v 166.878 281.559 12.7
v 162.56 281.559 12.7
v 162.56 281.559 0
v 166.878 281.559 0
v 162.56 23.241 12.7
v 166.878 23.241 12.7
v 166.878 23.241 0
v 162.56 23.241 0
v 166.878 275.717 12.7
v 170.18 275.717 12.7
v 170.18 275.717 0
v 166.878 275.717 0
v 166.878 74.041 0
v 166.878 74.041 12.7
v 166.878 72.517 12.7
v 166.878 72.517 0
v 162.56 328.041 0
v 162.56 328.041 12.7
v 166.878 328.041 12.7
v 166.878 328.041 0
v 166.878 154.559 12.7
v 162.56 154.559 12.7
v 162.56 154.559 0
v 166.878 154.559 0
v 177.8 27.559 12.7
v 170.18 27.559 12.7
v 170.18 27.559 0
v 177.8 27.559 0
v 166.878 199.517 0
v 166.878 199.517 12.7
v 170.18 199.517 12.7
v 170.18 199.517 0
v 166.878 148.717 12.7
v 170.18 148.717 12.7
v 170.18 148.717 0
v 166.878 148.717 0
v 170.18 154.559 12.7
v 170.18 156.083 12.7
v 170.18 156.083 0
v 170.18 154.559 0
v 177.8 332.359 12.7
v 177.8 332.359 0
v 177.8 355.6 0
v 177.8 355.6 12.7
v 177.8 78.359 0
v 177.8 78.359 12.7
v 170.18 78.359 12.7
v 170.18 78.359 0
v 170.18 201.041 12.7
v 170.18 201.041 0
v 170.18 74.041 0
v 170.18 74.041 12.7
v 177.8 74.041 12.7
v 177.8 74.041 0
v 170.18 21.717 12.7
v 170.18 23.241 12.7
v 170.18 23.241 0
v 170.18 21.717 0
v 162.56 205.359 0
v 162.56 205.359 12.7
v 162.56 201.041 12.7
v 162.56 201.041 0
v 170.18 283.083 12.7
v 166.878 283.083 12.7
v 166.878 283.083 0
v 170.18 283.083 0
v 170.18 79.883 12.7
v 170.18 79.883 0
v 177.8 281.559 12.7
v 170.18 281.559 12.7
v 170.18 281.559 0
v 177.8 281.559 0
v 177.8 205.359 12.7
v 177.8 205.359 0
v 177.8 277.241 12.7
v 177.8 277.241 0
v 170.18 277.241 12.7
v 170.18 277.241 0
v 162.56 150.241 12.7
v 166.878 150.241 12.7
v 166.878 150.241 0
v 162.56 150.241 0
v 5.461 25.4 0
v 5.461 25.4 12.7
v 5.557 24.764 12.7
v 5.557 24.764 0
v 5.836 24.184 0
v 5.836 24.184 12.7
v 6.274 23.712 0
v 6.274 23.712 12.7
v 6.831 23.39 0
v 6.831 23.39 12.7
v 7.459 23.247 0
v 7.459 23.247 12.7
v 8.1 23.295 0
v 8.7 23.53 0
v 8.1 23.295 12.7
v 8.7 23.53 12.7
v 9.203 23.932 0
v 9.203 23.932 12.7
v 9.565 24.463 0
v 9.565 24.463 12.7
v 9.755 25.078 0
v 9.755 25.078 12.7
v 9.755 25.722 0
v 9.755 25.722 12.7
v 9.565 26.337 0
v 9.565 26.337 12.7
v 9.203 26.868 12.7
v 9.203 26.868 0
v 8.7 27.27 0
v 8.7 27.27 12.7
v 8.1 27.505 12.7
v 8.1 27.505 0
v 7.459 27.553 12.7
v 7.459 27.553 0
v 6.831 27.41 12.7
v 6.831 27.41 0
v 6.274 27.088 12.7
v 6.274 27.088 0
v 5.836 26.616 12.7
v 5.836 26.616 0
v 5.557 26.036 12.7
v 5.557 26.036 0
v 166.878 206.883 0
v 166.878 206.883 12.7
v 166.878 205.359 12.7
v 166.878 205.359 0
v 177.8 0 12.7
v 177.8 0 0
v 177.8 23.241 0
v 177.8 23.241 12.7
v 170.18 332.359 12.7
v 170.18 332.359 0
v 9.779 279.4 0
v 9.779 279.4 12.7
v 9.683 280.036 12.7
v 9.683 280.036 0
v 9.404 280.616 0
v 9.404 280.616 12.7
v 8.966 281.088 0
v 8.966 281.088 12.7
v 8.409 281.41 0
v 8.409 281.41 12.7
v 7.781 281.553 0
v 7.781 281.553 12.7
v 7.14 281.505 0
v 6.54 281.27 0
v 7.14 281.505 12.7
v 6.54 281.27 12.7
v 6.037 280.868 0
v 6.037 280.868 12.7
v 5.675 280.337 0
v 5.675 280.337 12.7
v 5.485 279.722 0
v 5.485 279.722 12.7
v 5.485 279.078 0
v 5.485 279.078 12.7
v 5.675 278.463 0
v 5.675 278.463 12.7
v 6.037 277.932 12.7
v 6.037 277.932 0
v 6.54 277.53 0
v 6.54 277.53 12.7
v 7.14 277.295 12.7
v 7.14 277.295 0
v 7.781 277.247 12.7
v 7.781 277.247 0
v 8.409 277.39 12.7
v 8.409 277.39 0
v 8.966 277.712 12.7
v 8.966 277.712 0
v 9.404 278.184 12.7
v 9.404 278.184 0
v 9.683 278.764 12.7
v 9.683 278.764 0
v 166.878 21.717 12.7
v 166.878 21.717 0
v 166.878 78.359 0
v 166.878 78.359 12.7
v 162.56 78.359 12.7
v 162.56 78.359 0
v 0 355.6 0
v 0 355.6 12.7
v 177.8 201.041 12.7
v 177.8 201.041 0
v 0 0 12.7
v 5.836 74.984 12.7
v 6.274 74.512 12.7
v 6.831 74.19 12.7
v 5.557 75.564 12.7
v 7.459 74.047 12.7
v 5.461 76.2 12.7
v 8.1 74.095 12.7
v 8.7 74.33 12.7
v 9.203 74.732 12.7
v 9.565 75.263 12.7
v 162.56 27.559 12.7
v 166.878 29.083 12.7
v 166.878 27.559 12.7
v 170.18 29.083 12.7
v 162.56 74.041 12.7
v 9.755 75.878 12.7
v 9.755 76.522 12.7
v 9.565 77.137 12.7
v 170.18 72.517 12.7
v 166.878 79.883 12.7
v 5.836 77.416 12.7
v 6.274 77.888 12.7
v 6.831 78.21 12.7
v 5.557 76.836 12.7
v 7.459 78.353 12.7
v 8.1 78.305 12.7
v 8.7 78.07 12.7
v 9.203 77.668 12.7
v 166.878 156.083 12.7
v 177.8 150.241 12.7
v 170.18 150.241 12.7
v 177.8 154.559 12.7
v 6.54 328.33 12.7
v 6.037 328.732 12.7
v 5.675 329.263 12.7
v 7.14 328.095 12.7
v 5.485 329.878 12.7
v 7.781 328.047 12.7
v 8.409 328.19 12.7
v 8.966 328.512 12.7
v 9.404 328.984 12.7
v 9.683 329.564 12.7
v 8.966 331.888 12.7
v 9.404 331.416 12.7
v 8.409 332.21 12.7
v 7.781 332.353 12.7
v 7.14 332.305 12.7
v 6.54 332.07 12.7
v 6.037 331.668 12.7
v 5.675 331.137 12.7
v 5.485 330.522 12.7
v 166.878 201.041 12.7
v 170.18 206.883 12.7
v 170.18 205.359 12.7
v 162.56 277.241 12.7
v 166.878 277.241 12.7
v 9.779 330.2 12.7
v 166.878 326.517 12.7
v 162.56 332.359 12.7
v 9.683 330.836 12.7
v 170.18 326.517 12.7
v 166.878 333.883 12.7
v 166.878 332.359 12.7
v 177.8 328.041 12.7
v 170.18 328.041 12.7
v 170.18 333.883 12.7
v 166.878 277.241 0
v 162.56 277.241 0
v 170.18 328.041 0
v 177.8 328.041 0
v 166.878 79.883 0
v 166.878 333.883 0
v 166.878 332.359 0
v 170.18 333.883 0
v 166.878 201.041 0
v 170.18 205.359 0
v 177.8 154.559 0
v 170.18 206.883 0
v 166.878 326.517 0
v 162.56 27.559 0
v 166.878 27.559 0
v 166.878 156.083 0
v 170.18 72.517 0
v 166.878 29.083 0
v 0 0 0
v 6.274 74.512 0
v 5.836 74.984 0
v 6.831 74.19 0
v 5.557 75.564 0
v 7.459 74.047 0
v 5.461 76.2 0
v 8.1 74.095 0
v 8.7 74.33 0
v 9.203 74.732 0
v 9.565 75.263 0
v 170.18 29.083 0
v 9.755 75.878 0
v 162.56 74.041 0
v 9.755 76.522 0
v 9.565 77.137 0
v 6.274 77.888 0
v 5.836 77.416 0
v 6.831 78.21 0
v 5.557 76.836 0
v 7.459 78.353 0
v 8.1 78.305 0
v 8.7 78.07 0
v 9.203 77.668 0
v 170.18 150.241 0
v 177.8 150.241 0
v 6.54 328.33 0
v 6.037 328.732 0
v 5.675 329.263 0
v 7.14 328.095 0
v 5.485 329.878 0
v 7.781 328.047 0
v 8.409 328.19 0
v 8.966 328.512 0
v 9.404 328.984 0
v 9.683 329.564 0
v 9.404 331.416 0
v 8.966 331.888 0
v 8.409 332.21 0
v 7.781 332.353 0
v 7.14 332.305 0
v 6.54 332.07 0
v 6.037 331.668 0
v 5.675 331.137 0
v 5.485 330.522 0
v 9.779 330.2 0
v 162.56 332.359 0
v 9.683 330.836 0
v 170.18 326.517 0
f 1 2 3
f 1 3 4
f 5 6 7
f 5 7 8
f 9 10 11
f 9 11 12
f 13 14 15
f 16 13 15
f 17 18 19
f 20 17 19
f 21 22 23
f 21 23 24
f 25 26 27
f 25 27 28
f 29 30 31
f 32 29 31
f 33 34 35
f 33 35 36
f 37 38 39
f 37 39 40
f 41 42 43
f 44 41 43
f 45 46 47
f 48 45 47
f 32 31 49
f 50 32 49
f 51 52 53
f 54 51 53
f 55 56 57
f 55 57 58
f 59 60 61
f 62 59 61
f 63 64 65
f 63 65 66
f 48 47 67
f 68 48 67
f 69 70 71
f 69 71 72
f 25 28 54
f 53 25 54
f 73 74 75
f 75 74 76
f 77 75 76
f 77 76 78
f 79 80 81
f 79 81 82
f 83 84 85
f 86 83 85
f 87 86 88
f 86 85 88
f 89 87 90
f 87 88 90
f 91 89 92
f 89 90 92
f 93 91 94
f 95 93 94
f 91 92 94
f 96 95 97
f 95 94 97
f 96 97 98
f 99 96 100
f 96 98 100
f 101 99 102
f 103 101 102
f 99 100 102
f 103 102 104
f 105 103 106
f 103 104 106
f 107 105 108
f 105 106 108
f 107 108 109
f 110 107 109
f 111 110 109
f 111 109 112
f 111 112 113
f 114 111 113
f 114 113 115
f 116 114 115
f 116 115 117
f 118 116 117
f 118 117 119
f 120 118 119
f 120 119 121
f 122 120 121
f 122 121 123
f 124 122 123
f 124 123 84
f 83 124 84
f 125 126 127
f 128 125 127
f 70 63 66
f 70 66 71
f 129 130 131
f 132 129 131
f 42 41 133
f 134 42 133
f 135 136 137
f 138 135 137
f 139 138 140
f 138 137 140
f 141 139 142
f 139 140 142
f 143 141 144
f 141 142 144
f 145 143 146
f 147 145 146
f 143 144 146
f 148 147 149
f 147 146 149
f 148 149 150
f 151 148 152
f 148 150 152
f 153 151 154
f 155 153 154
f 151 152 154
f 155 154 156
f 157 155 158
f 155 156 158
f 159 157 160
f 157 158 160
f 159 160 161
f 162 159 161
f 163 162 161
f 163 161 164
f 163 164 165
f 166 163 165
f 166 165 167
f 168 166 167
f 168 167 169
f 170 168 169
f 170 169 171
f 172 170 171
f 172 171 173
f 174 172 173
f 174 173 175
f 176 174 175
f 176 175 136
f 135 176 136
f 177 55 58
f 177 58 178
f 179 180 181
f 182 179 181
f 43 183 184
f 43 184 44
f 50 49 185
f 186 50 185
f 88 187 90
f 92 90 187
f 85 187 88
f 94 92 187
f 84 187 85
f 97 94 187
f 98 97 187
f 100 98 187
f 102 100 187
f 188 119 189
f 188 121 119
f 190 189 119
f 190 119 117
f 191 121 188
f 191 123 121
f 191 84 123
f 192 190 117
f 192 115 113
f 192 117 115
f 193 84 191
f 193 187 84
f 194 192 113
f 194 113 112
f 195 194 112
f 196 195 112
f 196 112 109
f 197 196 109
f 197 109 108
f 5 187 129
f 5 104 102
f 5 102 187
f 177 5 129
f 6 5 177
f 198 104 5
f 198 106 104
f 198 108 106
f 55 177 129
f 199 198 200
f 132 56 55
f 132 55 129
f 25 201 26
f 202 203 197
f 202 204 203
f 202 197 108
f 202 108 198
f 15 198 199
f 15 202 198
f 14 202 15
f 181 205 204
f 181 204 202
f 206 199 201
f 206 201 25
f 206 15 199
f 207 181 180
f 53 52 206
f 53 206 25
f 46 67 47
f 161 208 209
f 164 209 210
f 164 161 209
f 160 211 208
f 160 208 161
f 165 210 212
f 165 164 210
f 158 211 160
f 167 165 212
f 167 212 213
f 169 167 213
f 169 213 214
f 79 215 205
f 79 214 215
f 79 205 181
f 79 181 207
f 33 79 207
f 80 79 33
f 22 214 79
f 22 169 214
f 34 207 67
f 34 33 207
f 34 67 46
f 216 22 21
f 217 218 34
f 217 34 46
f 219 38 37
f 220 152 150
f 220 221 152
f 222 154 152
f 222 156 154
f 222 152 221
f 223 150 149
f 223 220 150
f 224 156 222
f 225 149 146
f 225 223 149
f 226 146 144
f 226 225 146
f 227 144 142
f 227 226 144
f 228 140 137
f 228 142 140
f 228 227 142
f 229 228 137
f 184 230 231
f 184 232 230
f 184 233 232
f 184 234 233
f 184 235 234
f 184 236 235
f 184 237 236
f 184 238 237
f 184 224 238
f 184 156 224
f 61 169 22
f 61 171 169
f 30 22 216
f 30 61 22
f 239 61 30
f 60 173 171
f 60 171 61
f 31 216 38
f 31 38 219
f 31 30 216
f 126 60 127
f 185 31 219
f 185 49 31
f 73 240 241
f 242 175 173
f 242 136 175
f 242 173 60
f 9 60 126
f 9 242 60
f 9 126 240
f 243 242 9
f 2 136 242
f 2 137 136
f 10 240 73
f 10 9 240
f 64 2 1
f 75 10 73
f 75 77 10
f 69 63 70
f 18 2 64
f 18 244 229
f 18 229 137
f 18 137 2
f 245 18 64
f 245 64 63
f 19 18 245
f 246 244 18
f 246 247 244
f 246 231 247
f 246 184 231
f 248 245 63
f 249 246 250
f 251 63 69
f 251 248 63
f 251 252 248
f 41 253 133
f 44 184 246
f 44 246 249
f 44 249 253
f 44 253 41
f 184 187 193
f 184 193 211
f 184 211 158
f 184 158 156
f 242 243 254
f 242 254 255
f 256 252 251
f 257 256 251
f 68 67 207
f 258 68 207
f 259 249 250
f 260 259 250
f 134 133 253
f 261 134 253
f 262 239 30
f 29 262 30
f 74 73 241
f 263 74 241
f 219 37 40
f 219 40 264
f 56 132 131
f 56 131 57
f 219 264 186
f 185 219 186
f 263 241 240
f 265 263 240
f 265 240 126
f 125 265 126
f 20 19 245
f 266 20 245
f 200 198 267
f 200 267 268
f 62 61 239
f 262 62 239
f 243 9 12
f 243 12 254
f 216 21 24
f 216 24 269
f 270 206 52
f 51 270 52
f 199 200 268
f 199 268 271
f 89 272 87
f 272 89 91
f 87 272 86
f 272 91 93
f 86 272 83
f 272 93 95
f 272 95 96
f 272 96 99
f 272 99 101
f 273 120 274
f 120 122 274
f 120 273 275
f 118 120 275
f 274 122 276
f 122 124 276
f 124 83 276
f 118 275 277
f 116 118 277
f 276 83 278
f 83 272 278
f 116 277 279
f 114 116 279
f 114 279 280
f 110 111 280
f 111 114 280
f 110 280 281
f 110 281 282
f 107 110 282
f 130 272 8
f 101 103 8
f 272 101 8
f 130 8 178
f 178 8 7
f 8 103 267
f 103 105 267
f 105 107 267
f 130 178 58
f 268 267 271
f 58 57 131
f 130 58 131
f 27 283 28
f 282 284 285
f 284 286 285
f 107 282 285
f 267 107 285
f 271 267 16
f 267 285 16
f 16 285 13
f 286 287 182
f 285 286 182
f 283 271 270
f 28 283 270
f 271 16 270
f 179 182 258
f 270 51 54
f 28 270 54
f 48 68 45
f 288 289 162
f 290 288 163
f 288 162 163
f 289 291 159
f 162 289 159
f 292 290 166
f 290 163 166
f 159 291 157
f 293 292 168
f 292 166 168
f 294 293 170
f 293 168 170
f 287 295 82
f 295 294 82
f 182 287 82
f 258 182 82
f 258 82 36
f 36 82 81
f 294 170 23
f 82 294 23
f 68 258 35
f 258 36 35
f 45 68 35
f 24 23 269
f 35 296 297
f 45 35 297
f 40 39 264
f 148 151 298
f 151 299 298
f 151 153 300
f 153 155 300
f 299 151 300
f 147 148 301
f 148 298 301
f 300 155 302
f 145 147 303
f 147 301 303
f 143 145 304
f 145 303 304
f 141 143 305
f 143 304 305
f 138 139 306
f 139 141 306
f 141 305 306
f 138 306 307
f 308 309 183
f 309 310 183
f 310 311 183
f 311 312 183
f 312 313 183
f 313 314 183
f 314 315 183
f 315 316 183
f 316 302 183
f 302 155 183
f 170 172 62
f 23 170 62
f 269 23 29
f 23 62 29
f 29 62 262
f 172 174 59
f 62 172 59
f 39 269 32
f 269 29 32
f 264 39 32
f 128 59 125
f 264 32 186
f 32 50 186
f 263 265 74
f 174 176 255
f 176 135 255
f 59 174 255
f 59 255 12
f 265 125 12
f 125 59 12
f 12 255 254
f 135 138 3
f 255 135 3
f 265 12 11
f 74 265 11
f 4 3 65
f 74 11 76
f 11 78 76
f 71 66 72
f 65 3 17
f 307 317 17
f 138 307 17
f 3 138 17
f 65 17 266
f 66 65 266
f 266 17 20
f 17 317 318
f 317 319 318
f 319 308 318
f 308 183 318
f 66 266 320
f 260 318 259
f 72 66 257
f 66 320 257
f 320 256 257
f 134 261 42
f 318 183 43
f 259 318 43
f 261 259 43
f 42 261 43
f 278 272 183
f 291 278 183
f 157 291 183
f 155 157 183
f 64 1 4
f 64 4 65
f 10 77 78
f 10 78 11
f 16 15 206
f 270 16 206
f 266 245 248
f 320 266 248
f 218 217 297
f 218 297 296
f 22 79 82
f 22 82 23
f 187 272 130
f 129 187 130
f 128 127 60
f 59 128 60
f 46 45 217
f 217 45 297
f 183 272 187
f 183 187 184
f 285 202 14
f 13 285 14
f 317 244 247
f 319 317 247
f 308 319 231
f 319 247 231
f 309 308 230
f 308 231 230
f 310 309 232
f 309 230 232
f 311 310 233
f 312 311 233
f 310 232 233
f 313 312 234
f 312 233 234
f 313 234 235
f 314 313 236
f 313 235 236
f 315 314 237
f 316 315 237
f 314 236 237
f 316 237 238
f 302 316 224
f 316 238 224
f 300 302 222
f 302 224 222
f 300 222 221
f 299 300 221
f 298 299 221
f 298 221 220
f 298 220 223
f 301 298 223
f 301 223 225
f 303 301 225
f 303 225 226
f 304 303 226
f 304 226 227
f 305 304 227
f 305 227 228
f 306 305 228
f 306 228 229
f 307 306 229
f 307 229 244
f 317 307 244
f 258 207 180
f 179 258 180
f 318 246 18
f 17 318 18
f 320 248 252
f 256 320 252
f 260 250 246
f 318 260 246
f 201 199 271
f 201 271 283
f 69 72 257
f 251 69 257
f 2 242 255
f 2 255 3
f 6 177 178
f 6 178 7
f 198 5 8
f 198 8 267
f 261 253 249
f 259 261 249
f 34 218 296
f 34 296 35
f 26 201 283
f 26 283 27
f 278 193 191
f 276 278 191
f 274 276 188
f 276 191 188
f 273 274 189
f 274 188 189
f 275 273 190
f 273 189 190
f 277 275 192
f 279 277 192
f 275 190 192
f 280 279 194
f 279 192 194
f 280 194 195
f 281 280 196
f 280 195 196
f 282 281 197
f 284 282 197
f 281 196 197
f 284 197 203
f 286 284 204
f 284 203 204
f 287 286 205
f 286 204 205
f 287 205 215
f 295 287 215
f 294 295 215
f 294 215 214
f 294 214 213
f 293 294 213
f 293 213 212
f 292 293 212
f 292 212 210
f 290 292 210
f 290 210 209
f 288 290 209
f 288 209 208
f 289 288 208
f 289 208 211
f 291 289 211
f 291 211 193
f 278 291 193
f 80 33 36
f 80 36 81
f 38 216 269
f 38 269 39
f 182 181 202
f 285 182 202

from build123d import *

# Parameters (mm, degrees)
SKETCH1_W           = 177.8
SKETCH1_H           = 355.6
BOSS_EXTRUDE1_DEPTH = 12.7
SKETCH3_R           = 2.159
CUT_EXTRUDE1_DEPTH  = 398.775677989


with BuildPart() as part:
    # Sketch1 → Boss-Extrude1 (new body)
    with BuildSketch(Plane.XY):
        with Locations((88.9, 177.8)):
            Rectangle(SKETCH1_W, SKETCH1_H)
    extrude(amount=BOSS_EXTRUDE1_DEPTH)

    # Sketch3 → Cut-Extrude1 (cut, through all)
    with BuildSketch(Plane.XY.offset(12.7)):
        with Locations((7.62, 330.2)):
            Circle(SKETCH3_R)
        with Locations((7.62, 279.4)):
            Circle(SKETCH3_R)
        with Locations(Location((7.62, 76.2, 0), (0, 0, 180))):
            Circle(SKETCH3_R)
        with Locations(Location((7.62, 25.4, 0), (0, 0, 180))):
            Circle(SKETCH3_R)
        Polygon((177.8, 332.359), (170.18, 332.359), (170.18, 333.883), (166.878, 333.883), (166.878, 332.359), (162.56, 332.359), (162.56, 328.041), (166.878, 328.041), (166.878, 326.517), (170.18, 326.517), (170.18, 328.041), (177.8, 328.041), align=None)
        Polygon((177.8, 281.559), (177.8, 277.241), (170.18, 277.241), (170.18, 275.717), (166.878, 275.717), (166.878, 277.241), (162.56, 277.241), (162.56, 281.559), (166.878, 281.559), (166.878, 283.083), (170.18, 283.083), (170.18, 281.559), align=None)
        Polygon((177.8, 78.359), (170.18, 78.359), (170.18, 79.883), (166.878, 79.883), (166.878, 78.359), (162.56, 78.359), (162.56, 74.041), (166.878, 74.041), (166.878, 72.517), (170.18, 72.517), (170.18, 74.041), (177.8, 74.041), align=None)
        Polygon((177.8, 27.559), (177.8, 23.241), (170.18, 23.241), (170.18, 21.717), (166.878, 21.717), (166.878, 23.241), (162.56, 23.241), (162.56, 27.559), (166.878, 27.559), (166.878, 29.083), (170.18, 29.083), (170.18, 27.559), align=None)
        Polygon((177.8, 205.359), (170.18, 205.359), (170.18, 206.883), (166.878, 206.883), (166.878, 205.359), (162.56, 205.359), (162.56, 201.041), (166.878, 201.041), (166.878, 199.517), (170.18, 199.517), (170.18, 201.041), (177.8, 201.041), align=None)
        Polygon((177.8, 154.559), (177.8, 150.241), (170.18, 150.241), (170.18, 148.717), (166.878, 148.717), (166.878, 150.241), (162.56, 150.241), (162.56, 154.559), (166.878, 154.559), (166.878, 156.083), (170.18, 156.083), (170.18, 154.559), align=None)
    extrude(amount=-CUT_EXTRUDE1_DEPTH, mode=Mode.SUBTRACT)


solid = part.part
